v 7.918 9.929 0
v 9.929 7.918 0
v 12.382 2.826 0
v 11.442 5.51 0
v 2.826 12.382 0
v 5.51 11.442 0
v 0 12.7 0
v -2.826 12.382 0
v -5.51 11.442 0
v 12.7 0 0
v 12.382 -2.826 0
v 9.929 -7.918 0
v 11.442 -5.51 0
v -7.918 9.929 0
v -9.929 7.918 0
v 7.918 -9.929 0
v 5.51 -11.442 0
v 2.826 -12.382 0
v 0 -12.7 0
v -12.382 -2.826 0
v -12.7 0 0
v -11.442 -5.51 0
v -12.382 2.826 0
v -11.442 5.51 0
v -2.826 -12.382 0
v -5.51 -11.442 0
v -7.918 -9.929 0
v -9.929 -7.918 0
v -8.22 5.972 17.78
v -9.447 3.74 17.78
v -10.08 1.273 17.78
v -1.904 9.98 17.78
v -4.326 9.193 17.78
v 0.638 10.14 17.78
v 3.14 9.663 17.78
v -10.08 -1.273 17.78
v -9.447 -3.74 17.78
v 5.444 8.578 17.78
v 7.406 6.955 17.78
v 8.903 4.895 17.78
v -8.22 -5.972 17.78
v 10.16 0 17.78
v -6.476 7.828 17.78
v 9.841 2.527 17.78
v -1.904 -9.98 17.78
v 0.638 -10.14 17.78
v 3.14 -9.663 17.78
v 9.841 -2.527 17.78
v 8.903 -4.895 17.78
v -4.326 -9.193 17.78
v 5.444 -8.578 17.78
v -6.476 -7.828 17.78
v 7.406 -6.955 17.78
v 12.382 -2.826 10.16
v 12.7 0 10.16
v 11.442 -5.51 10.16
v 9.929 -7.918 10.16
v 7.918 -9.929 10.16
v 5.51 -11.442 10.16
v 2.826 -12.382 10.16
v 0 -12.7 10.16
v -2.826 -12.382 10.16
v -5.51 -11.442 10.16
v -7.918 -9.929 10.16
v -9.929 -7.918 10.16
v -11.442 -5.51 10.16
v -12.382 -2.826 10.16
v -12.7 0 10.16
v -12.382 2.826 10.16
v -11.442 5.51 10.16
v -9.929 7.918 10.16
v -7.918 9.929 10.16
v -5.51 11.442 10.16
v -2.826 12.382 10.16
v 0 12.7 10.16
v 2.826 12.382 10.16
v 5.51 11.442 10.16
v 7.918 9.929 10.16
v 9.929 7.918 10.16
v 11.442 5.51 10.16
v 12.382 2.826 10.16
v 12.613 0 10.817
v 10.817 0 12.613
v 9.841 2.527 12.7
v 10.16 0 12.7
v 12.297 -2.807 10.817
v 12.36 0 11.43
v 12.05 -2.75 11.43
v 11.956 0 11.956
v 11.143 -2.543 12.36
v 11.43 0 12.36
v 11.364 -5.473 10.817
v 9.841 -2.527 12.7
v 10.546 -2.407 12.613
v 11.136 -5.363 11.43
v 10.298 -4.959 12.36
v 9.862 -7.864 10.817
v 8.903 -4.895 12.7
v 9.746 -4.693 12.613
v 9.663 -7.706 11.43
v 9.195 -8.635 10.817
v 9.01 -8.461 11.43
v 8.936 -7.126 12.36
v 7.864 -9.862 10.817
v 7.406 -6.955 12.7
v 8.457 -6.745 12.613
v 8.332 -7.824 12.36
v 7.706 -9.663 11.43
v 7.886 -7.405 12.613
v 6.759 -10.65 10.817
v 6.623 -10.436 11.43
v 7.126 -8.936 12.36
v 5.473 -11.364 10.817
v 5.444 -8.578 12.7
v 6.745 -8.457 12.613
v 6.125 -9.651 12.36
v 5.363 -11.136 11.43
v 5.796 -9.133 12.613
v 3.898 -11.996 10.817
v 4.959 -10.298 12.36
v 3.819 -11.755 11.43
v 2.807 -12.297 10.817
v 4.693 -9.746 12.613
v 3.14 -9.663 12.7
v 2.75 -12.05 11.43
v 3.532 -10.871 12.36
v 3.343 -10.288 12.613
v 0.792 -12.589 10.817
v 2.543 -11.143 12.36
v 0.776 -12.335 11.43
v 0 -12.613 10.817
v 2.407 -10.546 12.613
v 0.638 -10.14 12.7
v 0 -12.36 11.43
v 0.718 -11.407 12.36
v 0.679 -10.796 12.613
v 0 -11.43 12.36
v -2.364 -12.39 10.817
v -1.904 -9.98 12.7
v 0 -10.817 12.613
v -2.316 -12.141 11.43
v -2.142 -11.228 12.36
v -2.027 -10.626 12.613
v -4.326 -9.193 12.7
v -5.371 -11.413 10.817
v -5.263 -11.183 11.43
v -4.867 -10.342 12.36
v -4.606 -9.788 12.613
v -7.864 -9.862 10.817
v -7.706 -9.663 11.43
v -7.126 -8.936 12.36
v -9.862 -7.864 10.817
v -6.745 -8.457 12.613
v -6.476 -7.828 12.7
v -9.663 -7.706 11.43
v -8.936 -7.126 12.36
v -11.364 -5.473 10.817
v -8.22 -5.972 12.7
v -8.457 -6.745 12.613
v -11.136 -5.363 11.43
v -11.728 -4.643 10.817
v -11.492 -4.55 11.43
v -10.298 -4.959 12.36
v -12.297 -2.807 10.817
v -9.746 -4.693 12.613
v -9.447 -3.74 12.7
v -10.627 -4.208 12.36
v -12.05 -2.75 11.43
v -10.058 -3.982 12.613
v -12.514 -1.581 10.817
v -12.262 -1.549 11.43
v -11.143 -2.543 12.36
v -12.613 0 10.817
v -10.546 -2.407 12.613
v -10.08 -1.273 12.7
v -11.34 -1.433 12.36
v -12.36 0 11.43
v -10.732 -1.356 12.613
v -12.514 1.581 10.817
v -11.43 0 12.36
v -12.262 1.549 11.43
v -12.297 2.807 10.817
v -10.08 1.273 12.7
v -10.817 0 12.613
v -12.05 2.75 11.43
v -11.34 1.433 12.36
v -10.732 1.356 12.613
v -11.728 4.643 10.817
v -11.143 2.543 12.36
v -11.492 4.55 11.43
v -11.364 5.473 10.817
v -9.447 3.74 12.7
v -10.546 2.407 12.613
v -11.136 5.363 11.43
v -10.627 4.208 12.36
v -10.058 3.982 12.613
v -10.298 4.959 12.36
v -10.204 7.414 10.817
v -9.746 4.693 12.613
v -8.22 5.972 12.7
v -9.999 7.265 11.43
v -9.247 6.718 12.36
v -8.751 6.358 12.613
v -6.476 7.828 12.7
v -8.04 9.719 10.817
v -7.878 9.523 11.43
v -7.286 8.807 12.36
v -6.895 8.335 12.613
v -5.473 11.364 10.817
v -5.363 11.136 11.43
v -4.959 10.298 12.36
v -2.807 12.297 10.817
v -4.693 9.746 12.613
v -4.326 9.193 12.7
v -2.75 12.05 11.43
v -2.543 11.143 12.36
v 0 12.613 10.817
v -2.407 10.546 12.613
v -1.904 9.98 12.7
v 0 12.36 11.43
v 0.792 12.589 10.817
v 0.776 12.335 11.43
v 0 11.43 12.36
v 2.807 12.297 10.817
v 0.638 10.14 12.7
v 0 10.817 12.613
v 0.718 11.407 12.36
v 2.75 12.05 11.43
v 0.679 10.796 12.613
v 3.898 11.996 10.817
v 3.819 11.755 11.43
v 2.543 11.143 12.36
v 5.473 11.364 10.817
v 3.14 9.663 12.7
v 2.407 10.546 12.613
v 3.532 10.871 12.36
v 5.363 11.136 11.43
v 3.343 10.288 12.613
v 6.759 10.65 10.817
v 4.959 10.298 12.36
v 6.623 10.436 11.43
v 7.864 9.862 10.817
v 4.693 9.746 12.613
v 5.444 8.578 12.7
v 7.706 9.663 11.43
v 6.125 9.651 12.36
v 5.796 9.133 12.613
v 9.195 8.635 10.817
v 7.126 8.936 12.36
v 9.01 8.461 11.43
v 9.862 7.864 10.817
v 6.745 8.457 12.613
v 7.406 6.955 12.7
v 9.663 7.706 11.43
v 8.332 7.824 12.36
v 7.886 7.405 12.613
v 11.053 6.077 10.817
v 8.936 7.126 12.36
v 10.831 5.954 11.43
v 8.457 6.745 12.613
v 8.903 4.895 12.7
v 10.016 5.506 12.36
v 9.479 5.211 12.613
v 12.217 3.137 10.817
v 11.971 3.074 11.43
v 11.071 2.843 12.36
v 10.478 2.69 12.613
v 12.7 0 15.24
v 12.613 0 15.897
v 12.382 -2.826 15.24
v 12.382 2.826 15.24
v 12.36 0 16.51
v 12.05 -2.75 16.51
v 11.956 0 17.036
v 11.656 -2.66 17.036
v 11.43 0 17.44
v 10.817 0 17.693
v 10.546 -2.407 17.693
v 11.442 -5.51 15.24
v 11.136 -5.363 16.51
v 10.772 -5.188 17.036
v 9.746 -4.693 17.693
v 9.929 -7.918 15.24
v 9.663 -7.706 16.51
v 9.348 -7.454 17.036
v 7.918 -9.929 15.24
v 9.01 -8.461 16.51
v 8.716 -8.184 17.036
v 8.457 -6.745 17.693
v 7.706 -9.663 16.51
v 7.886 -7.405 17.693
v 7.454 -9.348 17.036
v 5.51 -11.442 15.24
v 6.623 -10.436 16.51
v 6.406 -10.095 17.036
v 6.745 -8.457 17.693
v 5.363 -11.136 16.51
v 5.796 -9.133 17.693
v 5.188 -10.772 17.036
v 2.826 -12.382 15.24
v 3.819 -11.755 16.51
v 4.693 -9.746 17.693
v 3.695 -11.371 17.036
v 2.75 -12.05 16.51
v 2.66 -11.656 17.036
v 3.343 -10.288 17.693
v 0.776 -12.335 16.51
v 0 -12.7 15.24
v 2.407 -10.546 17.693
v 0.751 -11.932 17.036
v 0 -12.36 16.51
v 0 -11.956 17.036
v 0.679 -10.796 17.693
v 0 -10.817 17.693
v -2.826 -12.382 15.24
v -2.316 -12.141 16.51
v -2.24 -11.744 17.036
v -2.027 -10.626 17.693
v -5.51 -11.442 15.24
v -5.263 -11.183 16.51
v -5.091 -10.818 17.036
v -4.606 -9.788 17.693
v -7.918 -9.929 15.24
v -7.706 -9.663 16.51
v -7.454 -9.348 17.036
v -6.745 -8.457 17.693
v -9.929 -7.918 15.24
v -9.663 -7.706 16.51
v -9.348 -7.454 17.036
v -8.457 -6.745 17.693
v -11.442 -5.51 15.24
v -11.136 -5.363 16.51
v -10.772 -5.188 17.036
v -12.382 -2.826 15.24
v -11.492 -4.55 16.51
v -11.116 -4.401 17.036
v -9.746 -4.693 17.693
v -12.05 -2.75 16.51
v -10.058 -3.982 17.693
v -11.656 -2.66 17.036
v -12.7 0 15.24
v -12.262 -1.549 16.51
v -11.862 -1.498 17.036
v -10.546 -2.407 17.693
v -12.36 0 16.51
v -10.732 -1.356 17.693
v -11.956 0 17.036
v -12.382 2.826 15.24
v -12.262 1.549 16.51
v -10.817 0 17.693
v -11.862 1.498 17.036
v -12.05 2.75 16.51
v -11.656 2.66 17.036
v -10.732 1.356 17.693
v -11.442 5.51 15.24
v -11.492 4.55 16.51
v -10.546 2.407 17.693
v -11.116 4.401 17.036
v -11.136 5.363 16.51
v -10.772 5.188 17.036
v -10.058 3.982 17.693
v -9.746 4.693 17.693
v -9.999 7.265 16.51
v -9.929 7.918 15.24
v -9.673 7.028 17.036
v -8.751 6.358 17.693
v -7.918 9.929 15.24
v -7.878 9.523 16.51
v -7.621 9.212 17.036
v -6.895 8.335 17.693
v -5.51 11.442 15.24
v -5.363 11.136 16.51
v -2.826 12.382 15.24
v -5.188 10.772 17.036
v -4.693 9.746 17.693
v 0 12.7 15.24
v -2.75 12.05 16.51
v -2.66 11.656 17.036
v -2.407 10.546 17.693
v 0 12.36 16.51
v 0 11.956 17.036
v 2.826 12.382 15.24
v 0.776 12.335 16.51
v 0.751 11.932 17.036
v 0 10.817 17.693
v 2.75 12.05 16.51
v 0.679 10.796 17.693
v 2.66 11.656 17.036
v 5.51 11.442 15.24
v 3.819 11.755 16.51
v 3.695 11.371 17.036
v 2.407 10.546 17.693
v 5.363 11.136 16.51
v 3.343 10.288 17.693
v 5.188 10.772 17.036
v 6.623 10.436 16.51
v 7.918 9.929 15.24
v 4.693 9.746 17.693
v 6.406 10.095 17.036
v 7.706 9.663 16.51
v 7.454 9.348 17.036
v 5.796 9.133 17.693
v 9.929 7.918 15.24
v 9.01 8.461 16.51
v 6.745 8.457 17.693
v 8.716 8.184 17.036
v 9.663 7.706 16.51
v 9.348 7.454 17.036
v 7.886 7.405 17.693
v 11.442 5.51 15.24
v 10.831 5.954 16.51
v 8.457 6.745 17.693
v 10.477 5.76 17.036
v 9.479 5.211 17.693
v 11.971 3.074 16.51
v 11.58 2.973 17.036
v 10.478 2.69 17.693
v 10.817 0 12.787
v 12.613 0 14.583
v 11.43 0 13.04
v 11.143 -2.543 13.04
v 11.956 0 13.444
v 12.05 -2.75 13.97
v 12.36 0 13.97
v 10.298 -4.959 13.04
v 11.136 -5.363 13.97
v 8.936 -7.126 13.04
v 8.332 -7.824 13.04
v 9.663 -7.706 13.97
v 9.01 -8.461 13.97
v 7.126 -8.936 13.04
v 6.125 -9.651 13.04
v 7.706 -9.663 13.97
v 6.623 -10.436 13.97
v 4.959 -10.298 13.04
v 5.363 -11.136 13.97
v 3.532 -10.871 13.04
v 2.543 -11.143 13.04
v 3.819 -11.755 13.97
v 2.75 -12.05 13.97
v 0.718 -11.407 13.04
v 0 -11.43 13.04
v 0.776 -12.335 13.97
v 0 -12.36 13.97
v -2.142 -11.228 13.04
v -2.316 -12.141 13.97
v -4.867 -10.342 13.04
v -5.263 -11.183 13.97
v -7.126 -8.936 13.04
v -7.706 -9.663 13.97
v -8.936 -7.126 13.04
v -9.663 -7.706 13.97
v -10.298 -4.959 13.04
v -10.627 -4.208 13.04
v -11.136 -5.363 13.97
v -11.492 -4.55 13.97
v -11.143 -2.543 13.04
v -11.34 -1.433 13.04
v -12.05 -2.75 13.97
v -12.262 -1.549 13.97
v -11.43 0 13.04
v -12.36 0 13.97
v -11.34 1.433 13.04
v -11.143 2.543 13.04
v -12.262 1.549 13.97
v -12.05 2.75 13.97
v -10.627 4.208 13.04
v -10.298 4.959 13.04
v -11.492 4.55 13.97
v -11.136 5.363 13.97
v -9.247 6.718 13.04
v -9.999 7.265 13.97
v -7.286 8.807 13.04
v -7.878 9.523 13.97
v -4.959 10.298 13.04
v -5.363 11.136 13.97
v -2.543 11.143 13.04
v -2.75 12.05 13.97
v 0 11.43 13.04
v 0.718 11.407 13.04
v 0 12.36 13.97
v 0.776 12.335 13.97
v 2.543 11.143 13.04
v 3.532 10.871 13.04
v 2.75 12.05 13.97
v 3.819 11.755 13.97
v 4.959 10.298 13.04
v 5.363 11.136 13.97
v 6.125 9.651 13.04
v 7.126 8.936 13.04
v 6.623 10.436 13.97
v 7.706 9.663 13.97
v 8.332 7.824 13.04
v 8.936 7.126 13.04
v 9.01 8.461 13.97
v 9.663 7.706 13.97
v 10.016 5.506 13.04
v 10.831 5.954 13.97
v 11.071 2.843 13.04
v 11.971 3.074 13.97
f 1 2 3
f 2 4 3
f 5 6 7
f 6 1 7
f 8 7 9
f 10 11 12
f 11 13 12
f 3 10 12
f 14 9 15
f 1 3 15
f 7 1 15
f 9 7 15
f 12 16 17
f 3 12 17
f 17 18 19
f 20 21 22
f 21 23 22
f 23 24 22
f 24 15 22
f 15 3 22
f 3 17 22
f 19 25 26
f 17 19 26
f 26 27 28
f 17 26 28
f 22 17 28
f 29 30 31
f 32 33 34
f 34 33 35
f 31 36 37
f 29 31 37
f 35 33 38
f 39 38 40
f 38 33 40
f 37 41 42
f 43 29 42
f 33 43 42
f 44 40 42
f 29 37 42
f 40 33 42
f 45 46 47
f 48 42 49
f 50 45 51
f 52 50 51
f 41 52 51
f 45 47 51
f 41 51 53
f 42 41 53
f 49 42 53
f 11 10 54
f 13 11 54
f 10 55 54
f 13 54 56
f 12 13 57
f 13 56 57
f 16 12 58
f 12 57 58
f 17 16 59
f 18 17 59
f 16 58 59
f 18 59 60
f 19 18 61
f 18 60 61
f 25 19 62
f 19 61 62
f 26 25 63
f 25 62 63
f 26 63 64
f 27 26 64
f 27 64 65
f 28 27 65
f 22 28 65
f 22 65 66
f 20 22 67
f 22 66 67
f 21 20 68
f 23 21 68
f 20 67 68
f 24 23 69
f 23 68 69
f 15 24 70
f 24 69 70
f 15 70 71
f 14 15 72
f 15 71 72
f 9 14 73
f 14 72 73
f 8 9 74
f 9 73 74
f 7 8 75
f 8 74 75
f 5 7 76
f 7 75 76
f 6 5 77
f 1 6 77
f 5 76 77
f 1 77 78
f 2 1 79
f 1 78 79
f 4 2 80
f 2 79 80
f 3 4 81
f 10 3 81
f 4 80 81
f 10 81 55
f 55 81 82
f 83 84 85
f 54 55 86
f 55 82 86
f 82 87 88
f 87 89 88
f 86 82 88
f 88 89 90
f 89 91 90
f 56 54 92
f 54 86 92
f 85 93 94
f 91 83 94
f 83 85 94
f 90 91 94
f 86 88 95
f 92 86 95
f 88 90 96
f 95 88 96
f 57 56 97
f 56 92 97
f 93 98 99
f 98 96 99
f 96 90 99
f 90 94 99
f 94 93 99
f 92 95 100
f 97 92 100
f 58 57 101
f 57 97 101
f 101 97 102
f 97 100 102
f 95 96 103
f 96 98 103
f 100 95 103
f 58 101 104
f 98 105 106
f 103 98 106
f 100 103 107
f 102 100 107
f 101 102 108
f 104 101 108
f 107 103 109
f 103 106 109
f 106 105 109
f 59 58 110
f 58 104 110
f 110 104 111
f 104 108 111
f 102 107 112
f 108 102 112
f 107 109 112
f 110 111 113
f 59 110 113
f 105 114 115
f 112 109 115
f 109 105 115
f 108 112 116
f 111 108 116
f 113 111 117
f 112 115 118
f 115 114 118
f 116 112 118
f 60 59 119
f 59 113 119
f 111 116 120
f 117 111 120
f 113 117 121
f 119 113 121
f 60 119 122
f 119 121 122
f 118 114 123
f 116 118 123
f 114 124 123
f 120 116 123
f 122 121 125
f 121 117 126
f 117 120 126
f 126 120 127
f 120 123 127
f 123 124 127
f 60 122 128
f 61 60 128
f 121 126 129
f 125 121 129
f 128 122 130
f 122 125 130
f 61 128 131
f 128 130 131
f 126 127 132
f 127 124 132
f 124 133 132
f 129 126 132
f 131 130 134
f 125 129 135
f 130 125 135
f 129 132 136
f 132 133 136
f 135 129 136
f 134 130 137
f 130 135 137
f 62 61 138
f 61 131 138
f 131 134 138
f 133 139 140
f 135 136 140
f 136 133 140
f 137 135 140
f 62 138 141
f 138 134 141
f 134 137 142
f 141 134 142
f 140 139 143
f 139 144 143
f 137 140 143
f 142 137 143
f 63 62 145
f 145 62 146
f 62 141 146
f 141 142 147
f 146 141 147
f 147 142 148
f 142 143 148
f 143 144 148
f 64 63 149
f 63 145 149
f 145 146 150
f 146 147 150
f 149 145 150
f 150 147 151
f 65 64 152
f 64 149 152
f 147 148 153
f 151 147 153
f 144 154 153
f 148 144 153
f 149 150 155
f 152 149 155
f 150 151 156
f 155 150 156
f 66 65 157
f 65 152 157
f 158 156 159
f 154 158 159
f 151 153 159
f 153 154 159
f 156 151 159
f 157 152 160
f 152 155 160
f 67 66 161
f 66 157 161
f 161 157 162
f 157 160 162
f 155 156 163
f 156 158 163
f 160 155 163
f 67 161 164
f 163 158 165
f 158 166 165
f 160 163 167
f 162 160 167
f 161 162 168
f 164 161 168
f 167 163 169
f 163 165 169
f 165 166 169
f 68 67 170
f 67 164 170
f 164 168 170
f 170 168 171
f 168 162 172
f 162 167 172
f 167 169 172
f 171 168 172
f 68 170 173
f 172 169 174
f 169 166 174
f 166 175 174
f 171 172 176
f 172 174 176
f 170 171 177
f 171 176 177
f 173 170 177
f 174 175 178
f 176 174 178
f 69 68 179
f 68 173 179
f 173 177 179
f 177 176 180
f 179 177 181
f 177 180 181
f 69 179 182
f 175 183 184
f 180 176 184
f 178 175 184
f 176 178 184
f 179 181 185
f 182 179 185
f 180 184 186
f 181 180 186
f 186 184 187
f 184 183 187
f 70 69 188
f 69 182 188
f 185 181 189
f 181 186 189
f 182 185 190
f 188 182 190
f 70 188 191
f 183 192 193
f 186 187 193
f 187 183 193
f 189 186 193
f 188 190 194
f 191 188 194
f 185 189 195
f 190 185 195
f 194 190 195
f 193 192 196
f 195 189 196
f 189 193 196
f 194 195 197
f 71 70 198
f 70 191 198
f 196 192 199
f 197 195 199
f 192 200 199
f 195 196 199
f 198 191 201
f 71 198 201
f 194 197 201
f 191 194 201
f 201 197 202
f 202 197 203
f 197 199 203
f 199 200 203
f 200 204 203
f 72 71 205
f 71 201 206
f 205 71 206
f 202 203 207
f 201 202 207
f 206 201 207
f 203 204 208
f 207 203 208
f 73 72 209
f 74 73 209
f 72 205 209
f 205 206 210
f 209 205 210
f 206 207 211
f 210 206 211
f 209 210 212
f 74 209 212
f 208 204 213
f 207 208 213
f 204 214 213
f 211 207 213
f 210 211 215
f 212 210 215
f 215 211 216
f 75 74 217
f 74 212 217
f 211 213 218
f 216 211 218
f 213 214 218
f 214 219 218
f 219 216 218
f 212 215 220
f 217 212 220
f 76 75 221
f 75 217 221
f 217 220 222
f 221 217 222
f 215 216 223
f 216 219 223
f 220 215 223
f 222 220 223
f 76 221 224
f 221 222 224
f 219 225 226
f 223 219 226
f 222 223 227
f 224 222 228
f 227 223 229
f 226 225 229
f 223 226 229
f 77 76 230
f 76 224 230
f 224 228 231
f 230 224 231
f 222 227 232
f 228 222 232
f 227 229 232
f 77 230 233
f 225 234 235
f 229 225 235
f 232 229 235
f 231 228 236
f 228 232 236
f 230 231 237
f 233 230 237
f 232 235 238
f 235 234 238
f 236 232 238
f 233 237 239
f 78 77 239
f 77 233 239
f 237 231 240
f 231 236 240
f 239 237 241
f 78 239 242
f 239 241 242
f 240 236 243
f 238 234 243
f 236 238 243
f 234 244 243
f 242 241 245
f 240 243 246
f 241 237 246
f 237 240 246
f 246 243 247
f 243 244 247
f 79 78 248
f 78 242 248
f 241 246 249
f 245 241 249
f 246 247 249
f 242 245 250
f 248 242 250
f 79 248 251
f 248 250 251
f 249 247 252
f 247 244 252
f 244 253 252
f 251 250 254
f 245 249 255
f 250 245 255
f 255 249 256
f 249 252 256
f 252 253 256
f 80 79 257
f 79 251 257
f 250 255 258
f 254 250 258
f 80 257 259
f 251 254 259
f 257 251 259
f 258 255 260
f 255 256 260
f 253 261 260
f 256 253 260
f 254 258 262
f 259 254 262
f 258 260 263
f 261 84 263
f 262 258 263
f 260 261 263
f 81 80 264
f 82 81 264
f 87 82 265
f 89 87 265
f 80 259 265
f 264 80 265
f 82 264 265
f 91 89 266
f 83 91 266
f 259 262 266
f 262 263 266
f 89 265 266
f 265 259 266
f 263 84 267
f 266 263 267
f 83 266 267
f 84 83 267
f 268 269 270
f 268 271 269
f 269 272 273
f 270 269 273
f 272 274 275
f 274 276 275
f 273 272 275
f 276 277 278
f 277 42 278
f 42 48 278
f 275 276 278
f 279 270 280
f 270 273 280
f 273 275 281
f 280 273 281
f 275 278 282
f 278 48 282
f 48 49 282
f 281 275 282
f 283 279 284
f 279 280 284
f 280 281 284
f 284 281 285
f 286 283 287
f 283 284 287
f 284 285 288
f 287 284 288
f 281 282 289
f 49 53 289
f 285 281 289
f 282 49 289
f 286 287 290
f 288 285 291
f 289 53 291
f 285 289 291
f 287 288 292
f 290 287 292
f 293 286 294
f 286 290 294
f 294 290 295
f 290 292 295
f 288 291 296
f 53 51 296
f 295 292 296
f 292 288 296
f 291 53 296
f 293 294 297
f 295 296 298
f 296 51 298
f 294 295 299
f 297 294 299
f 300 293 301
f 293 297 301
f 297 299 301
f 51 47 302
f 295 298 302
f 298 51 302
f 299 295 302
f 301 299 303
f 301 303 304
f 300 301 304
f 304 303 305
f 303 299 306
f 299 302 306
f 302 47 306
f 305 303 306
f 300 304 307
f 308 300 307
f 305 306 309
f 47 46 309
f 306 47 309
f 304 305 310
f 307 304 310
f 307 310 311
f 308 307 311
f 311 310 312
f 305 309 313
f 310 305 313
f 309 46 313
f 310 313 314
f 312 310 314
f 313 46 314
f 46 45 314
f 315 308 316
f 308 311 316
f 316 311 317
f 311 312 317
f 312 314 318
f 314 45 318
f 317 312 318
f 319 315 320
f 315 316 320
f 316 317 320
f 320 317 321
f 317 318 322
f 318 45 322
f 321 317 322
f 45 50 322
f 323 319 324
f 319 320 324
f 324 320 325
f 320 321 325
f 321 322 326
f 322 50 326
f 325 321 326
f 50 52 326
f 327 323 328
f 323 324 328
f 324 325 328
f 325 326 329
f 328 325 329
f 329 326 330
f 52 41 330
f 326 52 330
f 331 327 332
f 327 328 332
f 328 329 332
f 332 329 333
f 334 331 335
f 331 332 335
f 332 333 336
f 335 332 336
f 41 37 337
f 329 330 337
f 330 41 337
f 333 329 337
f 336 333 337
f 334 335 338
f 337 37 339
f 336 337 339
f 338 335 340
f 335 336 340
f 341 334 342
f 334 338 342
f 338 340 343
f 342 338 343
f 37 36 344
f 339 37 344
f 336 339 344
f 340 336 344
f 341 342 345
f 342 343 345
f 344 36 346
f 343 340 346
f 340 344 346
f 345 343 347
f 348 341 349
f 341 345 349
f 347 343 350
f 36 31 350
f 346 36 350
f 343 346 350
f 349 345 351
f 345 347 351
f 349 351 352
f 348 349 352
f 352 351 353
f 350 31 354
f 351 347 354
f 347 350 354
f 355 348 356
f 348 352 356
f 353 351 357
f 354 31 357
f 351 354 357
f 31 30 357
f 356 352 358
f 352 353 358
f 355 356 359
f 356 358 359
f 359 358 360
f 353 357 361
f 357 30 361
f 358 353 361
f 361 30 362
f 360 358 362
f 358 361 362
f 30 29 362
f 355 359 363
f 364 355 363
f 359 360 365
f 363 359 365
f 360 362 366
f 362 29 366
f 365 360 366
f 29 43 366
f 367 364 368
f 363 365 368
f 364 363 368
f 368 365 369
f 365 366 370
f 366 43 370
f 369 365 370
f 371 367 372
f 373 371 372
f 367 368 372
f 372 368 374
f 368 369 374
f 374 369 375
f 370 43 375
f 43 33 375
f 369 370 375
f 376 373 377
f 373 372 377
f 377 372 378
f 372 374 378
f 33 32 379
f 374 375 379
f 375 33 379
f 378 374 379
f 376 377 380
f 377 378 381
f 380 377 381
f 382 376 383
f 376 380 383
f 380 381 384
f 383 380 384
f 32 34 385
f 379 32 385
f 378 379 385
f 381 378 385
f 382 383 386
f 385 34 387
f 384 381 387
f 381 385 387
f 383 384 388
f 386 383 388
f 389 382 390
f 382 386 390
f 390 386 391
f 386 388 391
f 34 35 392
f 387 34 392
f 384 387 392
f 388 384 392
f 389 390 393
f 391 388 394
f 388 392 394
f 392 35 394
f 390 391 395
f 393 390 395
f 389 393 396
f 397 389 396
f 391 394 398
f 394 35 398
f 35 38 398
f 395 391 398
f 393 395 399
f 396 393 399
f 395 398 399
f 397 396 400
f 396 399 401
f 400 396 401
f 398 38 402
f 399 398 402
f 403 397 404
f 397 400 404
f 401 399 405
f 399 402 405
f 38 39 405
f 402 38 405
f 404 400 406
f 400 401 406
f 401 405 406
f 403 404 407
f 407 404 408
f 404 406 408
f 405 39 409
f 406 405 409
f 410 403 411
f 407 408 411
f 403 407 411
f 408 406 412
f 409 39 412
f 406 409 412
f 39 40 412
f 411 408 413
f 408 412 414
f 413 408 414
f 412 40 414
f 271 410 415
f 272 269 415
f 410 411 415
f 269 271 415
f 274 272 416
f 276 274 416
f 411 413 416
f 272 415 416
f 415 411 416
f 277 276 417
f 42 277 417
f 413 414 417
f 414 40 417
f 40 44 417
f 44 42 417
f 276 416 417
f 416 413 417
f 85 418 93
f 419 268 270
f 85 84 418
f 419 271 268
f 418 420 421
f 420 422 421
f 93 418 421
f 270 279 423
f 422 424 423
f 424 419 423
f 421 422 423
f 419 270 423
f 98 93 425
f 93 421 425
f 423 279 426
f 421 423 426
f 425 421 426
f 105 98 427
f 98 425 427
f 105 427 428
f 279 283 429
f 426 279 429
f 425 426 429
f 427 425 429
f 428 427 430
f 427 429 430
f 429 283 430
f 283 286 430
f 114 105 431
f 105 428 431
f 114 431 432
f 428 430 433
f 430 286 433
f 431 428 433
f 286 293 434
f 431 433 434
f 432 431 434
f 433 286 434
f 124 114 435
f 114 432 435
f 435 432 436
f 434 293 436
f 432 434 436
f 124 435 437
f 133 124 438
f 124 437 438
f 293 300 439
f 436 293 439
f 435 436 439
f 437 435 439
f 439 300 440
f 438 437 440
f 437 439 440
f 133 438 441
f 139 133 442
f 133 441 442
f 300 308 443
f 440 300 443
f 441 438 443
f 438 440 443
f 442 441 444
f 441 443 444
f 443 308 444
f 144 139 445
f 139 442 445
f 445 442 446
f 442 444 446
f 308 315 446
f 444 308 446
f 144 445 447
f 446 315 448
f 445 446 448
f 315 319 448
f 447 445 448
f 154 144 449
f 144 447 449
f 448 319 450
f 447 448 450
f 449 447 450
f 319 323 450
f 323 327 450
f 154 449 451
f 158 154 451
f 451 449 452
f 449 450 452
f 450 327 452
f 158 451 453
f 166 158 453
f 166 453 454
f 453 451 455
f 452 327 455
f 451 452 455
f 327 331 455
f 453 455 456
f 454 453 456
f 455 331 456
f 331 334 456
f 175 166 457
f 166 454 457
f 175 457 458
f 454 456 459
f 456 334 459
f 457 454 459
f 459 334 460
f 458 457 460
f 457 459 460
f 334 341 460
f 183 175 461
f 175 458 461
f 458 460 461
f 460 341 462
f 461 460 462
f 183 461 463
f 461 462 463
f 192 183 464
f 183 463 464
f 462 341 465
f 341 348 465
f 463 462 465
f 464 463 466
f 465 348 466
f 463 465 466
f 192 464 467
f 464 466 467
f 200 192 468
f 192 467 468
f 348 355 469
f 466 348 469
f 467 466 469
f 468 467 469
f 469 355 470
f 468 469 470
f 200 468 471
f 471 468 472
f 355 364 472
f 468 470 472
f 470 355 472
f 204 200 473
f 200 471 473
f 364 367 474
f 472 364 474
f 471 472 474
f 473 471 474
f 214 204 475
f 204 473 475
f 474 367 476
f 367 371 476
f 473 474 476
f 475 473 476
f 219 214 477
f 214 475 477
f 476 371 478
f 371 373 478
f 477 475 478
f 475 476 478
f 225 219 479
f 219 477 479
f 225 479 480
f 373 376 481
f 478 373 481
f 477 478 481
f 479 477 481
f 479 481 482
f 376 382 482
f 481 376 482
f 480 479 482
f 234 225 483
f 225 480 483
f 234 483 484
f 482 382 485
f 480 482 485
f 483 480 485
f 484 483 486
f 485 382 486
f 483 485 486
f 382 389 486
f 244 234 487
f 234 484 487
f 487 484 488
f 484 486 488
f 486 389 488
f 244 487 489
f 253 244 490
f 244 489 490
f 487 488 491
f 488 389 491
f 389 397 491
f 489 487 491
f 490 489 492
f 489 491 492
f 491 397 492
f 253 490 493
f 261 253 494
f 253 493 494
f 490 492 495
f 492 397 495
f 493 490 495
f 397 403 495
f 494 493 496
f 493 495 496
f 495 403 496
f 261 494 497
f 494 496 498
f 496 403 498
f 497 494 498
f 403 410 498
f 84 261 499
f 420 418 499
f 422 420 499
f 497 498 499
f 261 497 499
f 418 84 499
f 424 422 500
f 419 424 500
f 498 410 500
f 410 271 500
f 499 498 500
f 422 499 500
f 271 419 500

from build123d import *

# Parameters (mm, degrees)
F2_R = 2.53999


# Not quite as in the source:
# - a fillet or chamfer is up to 0.001 mm smaller than in the source, because OpenCascade refuses the exact size


with BuildPart() as f1:
    # F0 (on Front) → F1 (revolve)
    with BuildSketch(Plane.XZ):
        with BuildLine():
            Line((0, 17.78), (0, 0))
            Line((0, 0), (12.7, 0))
            Line((12.7, 0), (12.7, 10.16))
            ThreePointArc((12.7, 10.16), (11.9560512242, 11.9560512242), (10.16, 12.7))
            ThreePointArc((10.16, 12.7), (11.9560512242, 13.4439487758), (12.7, 15.24))
            Line((12.7, 15.24), (12.7, 17.78))
            Line((12.7, 17.78), (0, 17.78))
        make_face()
    revolve(axis=Axis((0, 0, 8.89), (0, 0, -1)))

    # F2 (radius 2.54 in the source; OpenCascade refuses exactly that, so slightly less here)
    f2_edges = [f1.edges().sort_by_distance(p)[0] for p in [
        (-12.7, 0, 17.78),
    ]]
    fillet(f2_edges, radius=F2_R)


solid = f1.part
